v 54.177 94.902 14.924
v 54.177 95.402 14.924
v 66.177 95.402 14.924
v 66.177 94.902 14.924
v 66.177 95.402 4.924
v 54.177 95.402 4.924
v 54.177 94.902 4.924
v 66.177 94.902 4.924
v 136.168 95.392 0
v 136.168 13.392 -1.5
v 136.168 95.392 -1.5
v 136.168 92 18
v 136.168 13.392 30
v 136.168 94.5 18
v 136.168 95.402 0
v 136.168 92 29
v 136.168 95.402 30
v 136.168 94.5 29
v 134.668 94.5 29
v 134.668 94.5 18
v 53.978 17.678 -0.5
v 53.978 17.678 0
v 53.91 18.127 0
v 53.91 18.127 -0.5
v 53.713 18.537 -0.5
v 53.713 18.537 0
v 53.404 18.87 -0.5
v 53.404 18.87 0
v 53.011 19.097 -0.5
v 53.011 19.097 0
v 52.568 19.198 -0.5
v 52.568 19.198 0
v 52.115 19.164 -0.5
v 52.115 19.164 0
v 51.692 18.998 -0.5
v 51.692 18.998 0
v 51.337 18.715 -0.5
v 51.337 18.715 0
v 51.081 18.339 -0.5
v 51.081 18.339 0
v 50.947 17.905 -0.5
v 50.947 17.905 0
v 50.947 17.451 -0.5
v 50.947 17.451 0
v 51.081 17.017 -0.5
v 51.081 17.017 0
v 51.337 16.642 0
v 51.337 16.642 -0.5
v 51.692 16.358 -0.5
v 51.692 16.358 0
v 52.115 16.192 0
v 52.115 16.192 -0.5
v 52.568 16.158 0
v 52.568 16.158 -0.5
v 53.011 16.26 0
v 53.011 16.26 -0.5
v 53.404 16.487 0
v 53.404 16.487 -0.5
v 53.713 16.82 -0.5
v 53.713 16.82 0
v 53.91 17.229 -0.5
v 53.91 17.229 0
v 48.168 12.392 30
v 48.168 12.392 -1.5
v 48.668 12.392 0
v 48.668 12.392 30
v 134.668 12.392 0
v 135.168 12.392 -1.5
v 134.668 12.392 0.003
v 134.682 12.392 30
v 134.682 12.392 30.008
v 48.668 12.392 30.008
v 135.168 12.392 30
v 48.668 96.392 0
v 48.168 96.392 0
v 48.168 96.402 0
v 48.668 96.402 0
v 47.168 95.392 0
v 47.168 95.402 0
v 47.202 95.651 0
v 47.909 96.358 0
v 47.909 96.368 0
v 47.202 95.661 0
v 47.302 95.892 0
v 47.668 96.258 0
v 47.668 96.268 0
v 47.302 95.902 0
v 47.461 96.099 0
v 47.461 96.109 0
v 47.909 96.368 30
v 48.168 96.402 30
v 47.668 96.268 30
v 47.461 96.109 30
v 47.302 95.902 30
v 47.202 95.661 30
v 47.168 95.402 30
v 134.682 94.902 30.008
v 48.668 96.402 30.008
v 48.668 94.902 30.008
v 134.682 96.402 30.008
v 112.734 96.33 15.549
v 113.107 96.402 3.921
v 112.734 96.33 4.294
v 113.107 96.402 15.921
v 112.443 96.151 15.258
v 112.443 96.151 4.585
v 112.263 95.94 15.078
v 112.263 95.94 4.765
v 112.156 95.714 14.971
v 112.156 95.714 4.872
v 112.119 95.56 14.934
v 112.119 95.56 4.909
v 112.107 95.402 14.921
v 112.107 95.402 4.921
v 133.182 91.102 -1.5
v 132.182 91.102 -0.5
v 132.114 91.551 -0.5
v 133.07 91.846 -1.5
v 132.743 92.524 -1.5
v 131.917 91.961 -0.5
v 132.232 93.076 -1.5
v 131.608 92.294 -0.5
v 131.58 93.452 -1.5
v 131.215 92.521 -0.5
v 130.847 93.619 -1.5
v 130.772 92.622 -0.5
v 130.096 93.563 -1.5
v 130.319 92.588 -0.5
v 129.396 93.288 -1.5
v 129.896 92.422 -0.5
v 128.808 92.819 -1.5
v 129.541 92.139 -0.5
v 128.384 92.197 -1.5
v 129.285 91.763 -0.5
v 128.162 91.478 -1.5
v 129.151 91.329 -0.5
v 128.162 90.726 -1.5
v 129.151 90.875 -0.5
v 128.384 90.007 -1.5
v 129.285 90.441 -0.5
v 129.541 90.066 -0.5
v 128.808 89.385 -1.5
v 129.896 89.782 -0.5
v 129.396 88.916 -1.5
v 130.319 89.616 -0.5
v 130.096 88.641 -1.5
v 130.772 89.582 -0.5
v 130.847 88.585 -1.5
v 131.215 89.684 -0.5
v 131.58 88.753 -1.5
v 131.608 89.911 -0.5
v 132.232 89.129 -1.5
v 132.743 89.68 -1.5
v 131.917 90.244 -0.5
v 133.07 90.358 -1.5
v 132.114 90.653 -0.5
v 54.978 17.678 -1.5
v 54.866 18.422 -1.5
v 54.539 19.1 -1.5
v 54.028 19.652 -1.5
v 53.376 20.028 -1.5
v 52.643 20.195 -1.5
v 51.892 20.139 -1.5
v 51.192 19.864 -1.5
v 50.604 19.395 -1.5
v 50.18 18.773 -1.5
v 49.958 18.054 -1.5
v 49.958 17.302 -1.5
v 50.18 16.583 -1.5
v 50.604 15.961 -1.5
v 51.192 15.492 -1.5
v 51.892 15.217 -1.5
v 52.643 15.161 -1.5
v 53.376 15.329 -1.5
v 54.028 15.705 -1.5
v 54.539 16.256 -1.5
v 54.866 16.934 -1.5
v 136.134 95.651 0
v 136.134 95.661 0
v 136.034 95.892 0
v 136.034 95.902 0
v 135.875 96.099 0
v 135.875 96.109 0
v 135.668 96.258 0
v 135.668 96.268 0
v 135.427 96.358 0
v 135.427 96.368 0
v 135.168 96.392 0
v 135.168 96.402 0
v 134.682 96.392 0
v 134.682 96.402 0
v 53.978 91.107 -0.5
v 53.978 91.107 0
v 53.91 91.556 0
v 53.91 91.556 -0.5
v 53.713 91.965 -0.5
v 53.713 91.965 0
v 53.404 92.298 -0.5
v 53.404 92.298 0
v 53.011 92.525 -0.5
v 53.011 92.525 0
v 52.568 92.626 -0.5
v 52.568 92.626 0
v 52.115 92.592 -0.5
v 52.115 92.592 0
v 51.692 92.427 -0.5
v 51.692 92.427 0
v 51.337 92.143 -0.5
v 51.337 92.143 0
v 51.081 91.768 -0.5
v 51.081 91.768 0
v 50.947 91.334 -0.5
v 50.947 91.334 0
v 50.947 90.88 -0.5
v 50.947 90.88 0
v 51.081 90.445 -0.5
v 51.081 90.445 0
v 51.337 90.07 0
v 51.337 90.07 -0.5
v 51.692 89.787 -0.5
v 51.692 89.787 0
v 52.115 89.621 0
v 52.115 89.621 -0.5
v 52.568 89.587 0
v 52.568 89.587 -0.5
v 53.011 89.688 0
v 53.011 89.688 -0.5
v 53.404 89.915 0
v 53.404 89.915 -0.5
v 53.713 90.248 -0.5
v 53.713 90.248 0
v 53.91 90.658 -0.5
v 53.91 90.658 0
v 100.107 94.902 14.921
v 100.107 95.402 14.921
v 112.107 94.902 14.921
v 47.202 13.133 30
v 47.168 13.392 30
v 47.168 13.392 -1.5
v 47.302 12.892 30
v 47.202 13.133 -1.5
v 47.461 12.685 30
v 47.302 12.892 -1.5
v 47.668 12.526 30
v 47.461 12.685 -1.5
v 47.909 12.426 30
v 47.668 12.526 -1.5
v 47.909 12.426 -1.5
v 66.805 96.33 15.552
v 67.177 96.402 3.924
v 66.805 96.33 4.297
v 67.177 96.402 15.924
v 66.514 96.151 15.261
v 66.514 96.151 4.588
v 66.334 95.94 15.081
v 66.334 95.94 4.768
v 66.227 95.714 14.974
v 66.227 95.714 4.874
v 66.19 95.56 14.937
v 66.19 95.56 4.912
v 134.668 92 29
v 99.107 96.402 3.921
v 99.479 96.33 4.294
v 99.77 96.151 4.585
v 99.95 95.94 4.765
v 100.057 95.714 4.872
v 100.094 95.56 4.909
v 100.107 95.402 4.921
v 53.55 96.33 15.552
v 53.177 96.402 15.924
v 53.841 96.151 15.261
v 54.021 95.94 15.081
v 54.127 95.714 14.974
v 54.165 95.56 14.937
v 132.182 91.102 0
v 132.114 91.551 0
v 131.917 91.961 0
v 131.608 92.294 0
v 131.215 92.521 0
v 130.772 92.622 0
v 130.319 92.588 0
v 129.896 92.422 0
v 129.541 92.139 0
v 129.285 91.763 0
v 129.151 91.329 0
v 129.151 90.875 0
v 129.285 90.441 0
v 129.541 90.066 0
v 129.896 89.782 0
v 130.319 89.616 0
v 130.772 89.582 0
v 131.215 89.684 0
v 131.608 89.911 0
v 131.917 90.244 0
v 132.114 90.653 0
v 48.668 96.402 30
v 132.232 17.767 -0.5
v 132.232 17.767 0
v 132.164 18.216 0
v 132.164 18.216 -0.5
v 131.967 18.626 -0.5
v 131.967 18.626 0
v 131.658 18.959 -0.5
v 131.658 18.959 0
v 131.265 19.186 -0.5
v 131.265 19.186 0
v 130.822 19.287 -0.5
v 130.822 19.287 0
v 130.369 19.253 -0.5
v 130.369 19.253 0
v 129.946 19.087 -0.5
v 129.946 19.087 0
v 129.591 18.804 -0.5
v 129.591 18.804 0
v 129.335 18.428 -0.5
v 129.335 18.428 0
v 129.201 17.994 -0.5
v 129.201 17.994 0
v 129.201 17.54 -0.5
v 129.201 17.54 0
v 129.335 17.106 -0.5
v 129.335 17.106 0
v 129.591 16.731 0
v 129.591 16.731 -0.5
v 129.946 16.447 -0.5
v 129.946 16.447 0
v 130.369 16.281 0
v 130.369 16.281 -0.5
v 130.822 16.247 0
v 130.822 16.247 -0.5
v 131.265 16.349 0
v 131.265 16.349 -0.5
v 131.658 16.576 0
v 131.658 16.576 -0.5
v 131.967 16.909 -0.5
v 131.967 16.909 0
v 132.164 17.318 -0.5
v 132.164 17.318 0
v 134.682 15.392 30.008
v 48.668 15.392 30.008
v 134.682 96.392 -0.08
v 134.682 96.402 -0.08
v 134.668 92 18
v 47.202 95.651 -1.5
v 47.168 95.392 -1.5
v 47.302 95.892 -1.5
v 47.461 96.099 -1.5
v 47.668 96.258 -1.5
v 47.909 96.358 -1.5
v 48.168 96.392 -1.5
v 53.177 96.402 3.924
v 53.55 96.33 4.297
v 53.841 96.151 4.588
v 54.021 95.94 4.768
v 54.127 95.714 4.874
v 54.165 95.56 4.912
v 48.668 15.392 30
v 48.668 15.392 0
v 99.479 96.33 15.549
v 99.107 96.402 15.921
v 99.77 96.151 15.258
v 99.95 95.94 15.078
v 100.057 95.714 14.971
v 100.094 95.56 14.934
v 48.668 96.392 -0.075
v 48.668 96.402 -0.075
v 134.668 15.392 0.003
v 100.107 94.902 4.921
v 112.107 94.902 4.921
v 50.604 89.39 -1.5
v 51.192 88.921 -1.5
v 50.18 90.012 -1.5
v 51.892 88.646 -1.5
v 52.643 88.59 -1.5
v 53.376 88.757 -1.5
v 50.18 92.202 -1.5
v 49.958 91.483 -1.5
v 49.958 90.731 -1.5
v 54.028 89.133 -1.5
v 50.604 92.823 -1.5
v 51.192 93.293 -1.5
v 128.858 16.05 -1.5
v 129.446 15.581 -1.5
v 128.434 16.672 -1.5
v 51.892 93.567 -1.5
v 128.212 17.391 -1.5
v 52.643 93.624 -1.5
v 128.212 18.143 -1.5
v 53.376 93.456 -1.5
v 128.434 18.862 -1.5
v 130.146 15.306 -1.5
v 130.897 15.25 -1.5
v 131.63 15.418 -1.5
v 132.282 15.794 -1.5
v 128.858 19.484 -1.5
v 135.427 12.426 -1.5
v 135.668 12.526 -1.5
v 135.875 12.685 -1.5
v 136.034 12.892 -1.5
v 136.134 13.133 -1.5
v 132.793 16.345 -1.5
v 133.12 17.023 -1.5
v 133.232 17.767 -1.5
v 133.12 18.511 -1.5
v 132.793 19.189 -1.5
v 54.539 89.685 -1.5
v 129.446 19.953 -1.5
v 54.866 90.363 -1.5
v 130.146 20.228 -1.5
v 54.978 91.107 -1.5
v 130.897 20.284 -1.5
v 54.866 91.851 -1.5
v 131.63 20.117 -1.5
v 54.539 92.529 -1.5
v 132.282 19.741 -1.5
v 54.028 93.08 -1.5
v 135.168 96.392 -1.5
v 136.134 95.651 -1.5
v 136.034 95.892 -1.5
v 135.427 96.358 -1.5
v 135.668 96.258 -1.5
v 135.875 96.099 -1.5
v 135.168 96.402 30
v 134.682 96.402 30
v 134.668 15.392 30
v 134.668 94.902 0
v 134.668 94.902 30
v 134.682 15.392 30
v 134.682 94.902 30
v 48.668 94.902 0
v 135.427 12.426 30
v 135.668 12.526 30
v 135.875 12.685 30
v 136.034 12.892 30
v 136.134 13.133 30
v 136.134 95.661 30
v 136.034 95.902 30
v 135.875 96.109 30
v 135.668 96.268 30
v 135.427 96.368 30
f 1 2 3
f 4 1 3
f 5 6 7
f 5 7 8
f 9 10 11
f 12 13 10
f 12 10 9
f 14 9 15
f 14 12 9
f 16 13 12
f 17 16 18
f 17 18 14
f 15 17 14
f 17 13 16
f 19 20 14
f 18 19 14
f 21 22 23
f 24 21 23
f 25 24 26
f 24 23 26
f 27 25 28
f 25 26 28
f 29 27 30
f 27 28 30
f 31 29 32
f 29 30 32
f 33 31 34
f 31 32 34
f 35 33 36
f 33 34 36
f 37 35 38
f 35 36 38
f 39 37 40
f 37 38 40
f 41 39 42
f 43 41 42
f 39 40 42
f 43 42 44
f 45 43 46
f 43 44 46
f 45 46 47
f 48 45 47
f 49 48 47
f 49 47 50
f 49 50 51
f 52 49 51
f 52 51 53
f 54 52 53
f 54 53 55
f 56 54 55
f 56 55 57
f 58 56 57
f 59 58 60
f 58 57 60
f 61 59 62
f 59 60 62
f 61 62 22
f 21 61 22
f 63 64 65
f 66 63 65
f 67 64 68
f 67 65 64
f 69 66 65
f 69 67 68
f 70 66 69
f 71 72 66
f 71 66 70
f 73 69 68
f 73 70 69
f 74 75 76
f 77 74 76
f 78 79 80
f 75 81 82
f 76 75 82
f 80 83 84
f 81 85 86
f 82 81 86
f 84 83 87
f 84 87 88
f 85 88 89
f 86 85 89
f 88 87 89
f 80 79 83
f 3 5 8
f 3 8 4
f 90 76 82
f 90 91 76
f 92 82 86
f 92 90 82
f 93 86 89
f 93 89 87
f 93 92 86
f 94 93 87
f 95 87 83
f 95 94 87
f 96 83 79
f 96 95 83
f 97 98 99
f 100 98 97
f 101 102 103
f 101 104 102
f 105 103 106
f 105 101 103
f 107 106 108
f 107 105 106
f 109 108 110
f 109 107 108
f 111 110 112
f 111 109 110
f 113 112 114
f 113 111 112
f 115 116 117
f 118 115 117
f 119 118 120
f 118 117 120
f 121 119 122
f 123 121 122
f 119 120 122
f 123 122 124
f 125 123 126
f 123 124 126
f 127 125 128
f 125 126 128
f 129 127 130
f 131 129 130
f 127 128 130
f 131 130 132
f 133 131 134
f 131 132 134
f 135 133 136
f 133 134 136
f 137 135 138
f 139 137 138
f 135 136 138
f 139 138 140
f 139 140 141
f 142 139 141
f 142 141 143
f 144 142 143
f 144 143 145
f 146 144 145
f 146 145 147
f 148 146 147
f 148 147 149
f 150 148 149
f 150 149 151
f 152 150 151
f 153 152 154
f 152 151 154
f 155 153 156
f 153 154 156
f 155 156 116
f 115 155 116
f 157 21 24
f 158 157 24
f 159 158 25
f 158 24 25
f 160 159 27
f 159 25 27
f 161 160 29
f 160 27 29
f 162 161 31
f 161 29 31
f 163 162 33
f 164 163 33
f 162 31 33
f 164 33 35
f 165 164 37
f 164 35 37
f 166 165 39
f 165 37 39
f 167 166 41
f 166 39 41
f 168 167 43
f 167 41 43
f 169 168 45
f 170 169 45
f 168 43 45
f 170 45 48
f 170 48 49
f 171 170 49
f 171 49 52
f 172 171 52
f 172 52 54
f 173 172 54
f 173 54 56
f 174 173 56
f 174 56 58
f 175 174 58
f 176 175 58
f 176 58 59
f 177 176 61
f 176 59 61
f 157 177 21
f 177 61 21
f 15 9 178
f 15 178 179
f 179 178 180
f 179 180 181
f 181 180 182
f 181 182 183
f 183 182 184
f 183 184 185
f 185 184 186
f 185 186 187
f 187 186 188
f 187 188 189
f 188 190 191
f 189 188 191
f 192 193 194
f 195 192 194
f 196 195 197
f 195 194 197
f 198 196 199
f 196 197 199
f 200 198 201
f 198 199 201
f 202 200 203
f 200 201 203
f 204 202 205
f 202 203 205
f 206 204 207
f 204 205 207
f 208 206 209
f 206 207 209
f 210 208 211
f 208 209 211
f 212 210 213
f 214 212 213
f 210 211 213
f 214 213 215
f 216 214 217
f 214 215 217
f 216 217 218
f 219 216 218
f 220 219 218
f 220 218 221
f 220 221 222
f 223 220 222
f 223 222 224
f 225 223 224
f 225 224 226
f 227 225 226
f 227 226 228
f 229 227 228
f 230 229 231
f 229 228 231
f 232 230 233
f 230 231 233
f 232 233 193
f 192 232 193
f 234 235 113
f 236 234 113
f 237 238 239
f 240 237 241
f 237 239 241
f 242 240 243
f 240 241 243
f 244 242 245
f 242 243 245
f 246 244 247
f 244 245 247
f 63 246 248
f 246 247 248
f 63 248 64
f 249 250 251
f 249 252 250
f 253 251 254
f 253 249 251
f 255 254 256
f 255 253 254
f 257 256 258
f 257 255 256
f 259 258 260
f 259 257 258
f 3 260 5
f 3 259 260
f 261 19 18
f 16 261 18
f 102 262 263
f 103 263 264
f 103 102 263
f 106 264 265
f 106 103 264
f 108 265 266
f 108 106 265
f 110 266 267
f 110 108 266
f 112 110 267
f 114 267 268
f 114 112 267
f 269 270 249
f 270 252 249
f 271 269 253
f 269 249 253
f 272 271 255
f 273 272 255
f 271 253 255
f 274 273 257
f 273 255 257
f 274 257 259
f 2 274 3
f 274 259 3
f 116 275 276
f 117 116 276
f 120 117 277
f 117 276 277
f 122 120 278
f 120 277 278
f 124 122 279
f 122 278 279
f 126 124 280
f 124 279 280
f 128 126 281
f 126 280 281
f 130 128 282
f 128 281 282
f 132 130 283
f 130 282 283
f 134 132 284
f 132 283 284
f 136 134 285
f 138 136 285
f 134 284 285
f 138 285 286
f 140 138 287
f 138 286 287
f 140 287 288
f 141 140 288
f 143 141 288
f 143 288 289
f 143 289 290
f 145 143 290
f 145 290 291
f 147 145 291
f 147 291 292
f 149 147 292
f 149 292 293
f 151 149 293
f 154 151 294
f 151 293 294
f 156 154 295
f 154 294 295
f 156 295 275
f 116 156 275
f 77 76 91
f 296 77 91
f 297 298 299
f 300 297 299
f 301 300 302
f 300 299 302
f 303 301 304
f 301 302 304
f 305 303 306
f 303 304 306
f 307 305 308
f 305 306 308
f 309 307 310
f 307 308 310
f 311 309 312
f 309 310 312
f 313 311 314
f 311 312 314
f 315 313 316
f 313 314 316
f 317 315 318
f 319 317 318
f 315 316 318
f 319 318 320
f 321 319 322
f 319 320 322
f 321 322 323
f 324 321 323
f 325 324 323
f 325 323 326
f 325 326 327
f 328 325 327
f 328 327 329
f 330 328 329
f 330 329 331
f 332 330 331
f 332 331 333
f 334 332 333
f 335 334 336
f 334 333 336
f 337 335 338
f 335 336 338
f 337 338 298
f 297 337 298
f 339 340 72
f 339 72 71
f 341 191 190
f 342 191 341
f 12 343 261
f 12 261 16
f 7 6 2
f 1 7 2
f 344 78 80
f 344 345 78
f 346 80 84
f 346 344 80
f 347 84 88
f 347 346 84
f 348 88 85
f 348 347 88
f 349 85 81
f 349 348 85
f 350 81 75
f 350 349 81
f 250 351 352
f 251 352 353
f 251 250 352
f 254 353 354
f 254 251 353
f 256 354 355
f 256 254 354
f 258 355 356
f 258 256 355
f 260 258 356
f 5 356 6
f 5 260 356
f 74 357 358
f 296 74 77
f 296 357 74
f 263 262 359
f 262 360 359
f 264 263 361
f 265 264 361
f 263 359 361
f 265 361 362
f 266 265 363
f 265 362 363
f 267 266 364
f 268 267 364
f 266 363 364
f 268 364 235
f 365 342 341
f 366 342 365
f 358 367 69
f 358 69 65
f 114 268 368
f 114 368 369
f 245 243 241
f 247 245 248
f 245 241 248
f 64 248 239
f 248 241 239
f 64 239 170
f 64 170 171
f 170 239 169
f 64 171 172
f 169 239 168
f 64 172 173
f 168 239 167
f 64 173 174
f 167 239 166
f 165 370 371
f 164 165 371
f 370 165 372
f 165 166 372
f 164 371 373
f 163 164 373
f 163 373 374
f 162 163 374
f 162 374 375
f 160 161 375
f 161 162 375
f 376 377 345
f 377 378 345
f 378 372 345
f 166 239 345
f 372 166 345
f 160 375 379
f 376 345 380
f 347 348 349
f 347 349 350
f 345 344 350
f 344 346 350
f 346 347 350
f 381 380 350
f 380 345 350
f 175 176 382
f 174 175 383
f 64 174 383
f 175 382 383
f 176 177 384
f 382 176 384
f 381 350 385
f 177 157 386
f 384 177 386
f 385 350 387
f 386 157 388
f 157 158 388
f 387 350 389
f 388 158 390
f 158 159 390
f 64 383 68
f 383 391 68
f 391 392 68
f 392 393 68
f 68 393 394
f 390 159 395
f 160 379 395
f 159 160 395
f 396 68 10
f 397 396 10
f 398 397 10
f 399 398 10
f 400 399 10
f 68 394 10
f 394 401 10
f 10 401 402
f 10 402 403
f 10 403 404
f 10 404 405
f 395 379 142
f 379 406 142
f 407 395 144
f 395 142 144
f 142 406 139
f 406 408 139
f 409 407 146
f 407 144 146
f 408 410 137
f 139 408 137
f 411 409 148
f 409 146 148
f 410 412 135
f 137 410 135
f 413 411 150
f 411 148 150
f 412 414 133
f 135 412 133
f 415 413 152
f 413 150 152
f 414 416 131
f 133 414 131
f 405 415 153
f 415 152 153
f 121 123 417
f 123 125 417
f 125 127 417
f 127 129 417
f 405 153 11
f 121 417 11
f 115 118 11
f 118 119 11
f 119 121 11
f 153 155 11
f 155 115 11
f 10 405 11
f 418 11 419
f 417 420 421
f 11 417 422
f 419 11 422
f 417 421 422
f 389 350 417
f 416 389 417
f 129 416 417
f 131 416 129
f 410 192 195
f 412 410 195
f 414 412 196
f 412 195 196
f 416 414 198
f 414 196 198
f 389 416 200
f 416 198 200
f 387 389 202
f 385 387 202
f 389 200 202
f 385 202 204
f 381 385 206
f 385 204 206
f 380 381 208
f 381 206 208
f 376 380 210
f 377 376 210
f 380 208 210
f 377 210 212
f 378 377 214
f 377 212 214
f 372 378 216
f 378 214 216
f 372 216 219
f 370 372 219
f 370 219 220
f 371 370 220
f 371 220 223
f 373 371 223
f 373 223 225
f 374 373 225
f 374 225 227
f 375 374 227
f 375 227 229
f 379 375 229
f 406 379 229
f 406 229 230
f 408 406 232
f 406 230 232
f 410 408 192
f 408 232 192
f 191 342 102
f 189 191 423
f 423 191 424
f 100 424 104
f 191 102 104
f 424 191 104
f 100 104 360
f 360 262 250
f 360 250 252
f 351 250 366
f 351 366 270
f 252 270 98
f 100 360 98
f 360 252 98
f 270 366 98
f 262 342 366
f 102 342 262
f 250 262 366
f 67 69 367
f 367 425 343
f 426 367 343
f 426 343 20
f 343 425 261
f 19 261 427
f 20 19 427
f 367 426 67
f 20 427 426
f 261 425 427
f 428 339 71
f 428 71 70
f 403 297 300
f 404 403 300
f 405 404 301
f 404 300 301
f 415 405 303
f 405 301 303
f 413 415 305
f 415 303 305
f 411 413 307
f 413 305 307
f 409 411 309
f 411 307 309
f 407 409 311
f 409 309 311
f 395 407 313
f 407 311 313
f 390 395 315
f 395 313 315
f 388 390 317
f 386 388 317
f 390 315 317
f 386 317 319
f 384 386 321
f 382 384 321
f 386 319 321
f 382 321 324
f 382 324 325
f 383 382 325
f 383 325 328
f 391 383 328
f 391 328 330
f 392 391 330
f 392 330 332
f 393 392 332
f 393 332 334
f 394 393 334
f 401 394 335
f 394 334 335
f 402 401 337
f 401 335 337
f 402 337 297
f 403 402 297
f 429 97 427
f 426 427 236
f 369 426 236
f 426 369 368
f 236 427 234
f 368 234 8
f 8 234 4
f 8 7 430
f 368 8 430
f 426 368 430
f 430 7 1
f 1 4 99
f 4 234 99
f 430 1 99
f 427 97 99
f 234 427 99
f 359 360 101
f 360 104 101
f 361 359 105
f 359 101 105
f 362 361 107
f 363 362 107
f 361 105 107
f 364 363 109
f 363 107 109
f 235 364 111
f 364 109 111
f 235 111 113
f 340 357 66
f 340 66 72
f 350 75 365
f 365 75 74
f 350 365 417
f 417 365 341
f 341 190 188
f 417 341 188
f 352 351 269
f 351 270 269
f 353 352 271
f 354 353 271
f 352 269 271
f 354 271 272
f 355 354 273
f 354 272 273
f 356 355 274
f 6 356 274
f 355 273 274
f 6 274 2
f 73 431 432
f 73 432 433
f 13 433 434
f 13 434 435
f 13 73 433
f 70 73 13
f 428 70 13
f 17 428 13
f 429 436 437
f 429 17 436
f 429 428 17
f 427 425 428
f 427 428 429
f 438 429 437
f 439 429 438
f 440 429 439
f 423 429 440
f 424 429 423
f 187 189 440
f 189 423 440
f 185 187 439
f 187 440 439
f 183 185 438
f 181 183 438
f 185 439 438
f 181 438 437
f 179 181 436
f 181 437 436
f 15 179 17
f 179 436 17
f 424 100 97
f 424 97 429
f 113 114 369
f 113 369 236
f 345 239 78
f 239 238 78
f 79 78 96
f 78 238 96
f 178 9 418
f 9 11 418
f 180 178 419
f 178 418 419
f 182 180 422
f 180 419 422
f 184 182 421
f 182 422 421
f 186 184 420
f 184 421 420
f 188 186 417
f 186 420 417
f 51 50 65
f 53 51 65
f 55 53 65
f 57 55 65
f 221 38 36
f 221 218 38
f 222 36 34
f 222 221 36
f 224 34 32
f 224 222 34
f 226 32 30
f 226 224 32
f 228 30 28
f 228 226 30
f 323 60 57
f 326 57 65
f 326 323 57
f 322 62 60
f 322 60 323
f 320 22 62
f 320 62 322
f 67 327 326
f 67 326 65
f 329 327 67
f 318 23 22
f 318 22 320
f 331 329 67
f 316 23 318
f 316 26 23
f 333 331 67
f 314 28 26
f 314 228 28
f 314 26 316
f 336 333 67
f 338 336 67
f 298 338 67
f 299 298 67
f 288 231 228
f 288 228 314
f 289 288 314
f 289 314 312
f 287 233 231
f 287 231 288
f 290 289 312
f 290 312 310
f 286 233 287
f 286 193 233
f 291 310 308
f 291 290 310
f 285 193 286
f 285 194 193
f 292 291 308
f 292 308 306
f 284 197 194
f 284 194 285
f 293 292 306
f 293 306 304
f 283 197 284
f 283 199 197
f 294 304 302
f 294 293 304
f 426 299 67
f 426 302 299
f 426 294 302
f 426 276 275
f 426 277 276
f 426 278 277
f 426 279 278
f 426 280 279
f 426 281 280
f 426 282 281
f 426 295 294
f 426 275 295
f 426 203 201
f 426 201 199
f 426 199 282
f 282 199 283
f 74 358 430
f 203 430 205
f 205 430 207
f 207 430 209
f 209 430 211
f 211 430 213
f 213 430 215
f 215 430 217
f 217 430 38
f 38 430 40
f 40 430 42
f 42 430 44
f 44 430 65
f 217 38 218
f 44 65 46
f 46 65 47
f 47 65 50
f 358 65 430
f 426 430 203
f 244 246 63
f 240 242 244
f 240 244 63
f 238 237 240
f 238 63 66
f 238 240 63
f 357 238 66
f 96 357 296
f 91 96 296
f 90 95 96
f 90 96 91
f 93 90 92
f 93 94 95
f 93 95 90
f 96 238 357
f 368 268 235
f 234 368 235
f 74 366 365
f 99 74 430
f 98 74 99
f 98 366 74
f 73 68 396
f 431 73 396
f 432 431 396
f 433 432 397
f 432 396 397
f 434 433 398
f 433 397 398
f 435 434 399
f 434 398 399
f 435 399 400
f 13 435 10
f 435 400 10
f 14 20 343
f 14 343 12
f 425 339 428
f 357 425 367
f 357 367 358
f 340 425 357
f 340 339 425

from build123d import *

# Parameters (mm, degrees)
BOX_W            = 20
BOX_H            = 2.5
BOX_DEPTH        = 11
SKETCH005_W      = 12
SKETCH005_H      = 10
EXTRUDE008_DEPTH = 1.5
SKETCH002_W      = 84.01
SKETCH002_H      = 30
EXTRUDE002_DEPTH = 1.5
FILLET001_R      = 1
FILLET003_R      = 1
SKETCH003_W      = 84.01
SKETCH003_H      = 30
EXTRUDE007_DEPTH = 1.5
FILLET005_R      = 1
SKETCH001_W      = 89
SKETCH001_H      = 84
SKETCH001_R      = 1.524
EXTRUDE001_DEPTH = 1.5
FILLET_R         = 1
FILLET002_R      = 1
FILLET004_R      = 1
FILLET006_R      = 1
EXTRUDE004_DEPTH = 3
FILLET011_R      = 1
CHAMFER_SIZE     = 1
CHAMFER001_SIZE  = 1
CHAMFER002_SIZE  = 1
CHAMFER003_SIZE  = 1
FILLET016_R      = 1
FILLET017_R      = 1


with BuildPart() as box:
    # Box → Box (new body)
    with BuildSketch(Plane(origin=(134, 92, 18), x_dir=(1, 0, 0), z_dir=(0, 0, 1))):
        with Locations((10, 1.25)):
            Rectangle(BOX_W, BOX_H)
    extrude(amount=BOX_DEPTH)


with BuildPart() as extrude008:
    # Sketch005 → Extrude008 (new body)
    with BuildSketch(Plane.XZ):
        Polygon((48.658601, 30.00186), (134.672964, 30.001823), (134.673007, -0.086485), (48.658601, -0.081194), align=None)
        with Locations((60.167907, 9.918134)):
            Rectangle(SKETCH005_W, SKETCH005_H, mode=Mode.SUBTRACT)
        with Locations((106.097198, 9.915282)):
            Rectangle(SKETCH005_W, SKETCH005_H, mode=Mode.SUBTRACT)
    extrude(amount=EXTRUDE008_DEPTH)


with BuildPart() as extrude008_1:
    # Extrude008 placement: moved
    add(extrude008.part.moved(Location((0.009309, 96.402171, 0.006059))))


with BuildPart() as fillet003:
    # Sketch002 → Extrude002 (new body)
    with BuildSketch(Plane.YZ):
        with Locations((54.387171, 15)):
            Rectangle(SKETCH002_W, SKETCH002_H)
    extrude(amount=EXTRUDE002_DEPTH)


with BuildPart() as fillet003_1:
    # Extrude002 placement: moved
    add(fillet003.part.moved(Location((47.167907, 0.01, 0))))

    # Fillet001
    fillet001_edges = [fillet003_1.edges().sort_by_distance(p)[0] for p in [
        (47.167907, 96.402171, 15),
    ]]
    fillet(fillet001_edges, radius=FILLET001_R)

    # Fillet003
    fillet003_edges = [fillet003_1.edges().sort_by_distance(p)[0] for p in [
        (47.167907, 12.392171, 15),
    ]]
    fillet(fillet003_edges, radius=FILLET003_R)


with BuildPart() as fillet005:
    # Sketch003 → Extrude007 (new body)
    with BuildSketch(Plane.YZ):
        with Locations((54.387171, 15)):
            Rectangle(SKETCH003_W, SKETCH003_H)
    extrude(amount=EXTRUDE007_DEPTH)


with BuildPart() as fillet005_1:
    # Extrude007 placement: moved
    add(fillet005.part.moved(Location((134.667907, 0.01, 0))))

    # Fillet005
    fillet005_edges = [fillet005_1.edges().sort_by_distance(p)[0] for p in [
        (136.167907, 12.392171, 15),
    ]]
    fillet(fillet005_edges, radius=FILLET005_R)


with BuildPart() as fillet006:
    # Sketch001 → Extrude001 (new body)
    with BuildSketch(Plane.XY):
        with Locations((91.667907, 54.392171)):
            Rectangle(SKETCH001_W, SKETCH001_H)
        with Locations((52.453907, 91.106708)):
            Circle(SKETCH001_R, mode=Mode.SUBTRACT)
        with Locations((130.657907, 91.102171)):
            Circle(SKETCH001_R, mode=Mode.SUBTRACT)
        with Locations((130.707907, 17.767171)):
            Circle(SKETCH001_R, mode=Mode.SUBTRACT)
        with Locations((52.453907, 17.678171)):
            Circle(SKETCH001_R, mode=Mode.SUBTRACT)
    extrude(amount=-EXTRUDE001_DEPTH)

    # Fillet
    fillet_edges = [fillet006.edges().sort_by_distance(p)[0] for p in [
        (47.167907, 96.392171, -0.75),
    ]]
    fillet(fillet_edges, radius=FILLET_R)

    # Fillet002
    fillet002_edges = [fillet006.edges().sort_by_distance(p)[0] for p in [
        (47.167907, 12.392171, -0.75),
    ]]
    fillet(fillet002_edges, radius=FILLET002_R)

    # Fillet004
    fillet004_edges = [fillet006.edges().sort_by_distance(p)[0] for p in [
        (136.167907, 12.392171, -0.75),
    ]]
    fillet(fillet004_edges, radius=FILLET004_R)

    # Fillet006
    fillet006_edges = [fillet006.edges().sort_by_distance(p)[0] for p in [
        (136.167907, 96.392171, -0.75),
    ]]
    fillet(fillet006_edges, radius=FILLET006_R)


with BuildPart() as fillet017:
    # Sketch004 (on Sketch) → Extrude004 (new body)
    with BuildSketch(Plane.XZ):
        Polygon((48.658598, 30.00186), (134.672964, 30.001823), (134.672964, -0.003143), (48.658598, -0.006059), align=None)
    extrude(amount=EXTRUDE004_DEPTH)


with BuildPart() as fillet017_1:
    # Extrude004 placement: moved
    add(fillet017.part.moved(Location((0.009309, 15.392171, 0.006059))))

    # Fusion: union Extrude008, Fillet003, Fillet005, Fillet006
    add(extrude008_1.part)
    add(fillet003_1.part)
    add(fillet005_1.part)
    add(fillet006.part)

    # Fillet011
    fillet011_edges = [fillet017_1.edges().sort_by_distance(p)[0] for p in [
        (136.167907, 96.402171, 15),
    ]]
    fillet(fillet011_edges, radius=FILLET011_R)

    # Chamfer
    chamfer_edges = [fillet017_1.edges().sort_by_distance(p)[0] for p in [
        (50.929907, 17.678171, -1.5),
    ]]
    chamfer(chamfer_edges, length=CHAMFER_SIZE)

    # Chamfer001
    chamfer001_edges = [fillet017_1.edges().sort_by_distance(p)[0] for p in [
        (129.183907, 17.767171, -1.5),
    ]]
    chamfer(chamfer001_edges, length=CHAMFER001_SIZE)

    # Chamfer002
    chamfer002_edges = [fillet017_1.edges().sort_by_distance(p)[0] for p in [
        (129.133907, 91.102171, -1.5),
    ]]
    chamfer(chamfer002_edges, length=CHAMFER002_SIZE)

    # Chamfer003
    chamfer003_edges = [fillet017_1.edges().sort_by_distance(p)[0] for p in [
        (50.929907, 91.106708, -1.5),
    ]]
    chamfer(chamfer003_edges, length=CHAMFER003_SIZE)

    # Cut: cut Box
    add(box.part, mode=Mode.SUBTRACT)

    # Fillet016
    fillet016_edges = [fillet017_1.edges().sort_by_distance(p)[0] for p in [
        (106.106507, 96.402171, 14.921341),
        (100.106507, 96.402171, 9.921341),
        (106.106507, 96.402171, 4.921341),
        (112.106507, 96.402171, 9.921341),
    ]]
    fillet(fillet016_edges, radius=FILLET016_R)

    # Fillet017
    fillet017_edges = [fillet017_1.edges().sort_by_distance(p)[0] for p in [
        (60.177215, 96.402171, 14.924193),
        (54.177215, 96.402171, 9.924193),
        (60.177215, 96.402171, 4.924193),
        (66.177215, 96.402171, 9.924193),
    ]]
    fillet(fillet017_edges, radius=FILLET017_R)


solid = fillet017_1.part
